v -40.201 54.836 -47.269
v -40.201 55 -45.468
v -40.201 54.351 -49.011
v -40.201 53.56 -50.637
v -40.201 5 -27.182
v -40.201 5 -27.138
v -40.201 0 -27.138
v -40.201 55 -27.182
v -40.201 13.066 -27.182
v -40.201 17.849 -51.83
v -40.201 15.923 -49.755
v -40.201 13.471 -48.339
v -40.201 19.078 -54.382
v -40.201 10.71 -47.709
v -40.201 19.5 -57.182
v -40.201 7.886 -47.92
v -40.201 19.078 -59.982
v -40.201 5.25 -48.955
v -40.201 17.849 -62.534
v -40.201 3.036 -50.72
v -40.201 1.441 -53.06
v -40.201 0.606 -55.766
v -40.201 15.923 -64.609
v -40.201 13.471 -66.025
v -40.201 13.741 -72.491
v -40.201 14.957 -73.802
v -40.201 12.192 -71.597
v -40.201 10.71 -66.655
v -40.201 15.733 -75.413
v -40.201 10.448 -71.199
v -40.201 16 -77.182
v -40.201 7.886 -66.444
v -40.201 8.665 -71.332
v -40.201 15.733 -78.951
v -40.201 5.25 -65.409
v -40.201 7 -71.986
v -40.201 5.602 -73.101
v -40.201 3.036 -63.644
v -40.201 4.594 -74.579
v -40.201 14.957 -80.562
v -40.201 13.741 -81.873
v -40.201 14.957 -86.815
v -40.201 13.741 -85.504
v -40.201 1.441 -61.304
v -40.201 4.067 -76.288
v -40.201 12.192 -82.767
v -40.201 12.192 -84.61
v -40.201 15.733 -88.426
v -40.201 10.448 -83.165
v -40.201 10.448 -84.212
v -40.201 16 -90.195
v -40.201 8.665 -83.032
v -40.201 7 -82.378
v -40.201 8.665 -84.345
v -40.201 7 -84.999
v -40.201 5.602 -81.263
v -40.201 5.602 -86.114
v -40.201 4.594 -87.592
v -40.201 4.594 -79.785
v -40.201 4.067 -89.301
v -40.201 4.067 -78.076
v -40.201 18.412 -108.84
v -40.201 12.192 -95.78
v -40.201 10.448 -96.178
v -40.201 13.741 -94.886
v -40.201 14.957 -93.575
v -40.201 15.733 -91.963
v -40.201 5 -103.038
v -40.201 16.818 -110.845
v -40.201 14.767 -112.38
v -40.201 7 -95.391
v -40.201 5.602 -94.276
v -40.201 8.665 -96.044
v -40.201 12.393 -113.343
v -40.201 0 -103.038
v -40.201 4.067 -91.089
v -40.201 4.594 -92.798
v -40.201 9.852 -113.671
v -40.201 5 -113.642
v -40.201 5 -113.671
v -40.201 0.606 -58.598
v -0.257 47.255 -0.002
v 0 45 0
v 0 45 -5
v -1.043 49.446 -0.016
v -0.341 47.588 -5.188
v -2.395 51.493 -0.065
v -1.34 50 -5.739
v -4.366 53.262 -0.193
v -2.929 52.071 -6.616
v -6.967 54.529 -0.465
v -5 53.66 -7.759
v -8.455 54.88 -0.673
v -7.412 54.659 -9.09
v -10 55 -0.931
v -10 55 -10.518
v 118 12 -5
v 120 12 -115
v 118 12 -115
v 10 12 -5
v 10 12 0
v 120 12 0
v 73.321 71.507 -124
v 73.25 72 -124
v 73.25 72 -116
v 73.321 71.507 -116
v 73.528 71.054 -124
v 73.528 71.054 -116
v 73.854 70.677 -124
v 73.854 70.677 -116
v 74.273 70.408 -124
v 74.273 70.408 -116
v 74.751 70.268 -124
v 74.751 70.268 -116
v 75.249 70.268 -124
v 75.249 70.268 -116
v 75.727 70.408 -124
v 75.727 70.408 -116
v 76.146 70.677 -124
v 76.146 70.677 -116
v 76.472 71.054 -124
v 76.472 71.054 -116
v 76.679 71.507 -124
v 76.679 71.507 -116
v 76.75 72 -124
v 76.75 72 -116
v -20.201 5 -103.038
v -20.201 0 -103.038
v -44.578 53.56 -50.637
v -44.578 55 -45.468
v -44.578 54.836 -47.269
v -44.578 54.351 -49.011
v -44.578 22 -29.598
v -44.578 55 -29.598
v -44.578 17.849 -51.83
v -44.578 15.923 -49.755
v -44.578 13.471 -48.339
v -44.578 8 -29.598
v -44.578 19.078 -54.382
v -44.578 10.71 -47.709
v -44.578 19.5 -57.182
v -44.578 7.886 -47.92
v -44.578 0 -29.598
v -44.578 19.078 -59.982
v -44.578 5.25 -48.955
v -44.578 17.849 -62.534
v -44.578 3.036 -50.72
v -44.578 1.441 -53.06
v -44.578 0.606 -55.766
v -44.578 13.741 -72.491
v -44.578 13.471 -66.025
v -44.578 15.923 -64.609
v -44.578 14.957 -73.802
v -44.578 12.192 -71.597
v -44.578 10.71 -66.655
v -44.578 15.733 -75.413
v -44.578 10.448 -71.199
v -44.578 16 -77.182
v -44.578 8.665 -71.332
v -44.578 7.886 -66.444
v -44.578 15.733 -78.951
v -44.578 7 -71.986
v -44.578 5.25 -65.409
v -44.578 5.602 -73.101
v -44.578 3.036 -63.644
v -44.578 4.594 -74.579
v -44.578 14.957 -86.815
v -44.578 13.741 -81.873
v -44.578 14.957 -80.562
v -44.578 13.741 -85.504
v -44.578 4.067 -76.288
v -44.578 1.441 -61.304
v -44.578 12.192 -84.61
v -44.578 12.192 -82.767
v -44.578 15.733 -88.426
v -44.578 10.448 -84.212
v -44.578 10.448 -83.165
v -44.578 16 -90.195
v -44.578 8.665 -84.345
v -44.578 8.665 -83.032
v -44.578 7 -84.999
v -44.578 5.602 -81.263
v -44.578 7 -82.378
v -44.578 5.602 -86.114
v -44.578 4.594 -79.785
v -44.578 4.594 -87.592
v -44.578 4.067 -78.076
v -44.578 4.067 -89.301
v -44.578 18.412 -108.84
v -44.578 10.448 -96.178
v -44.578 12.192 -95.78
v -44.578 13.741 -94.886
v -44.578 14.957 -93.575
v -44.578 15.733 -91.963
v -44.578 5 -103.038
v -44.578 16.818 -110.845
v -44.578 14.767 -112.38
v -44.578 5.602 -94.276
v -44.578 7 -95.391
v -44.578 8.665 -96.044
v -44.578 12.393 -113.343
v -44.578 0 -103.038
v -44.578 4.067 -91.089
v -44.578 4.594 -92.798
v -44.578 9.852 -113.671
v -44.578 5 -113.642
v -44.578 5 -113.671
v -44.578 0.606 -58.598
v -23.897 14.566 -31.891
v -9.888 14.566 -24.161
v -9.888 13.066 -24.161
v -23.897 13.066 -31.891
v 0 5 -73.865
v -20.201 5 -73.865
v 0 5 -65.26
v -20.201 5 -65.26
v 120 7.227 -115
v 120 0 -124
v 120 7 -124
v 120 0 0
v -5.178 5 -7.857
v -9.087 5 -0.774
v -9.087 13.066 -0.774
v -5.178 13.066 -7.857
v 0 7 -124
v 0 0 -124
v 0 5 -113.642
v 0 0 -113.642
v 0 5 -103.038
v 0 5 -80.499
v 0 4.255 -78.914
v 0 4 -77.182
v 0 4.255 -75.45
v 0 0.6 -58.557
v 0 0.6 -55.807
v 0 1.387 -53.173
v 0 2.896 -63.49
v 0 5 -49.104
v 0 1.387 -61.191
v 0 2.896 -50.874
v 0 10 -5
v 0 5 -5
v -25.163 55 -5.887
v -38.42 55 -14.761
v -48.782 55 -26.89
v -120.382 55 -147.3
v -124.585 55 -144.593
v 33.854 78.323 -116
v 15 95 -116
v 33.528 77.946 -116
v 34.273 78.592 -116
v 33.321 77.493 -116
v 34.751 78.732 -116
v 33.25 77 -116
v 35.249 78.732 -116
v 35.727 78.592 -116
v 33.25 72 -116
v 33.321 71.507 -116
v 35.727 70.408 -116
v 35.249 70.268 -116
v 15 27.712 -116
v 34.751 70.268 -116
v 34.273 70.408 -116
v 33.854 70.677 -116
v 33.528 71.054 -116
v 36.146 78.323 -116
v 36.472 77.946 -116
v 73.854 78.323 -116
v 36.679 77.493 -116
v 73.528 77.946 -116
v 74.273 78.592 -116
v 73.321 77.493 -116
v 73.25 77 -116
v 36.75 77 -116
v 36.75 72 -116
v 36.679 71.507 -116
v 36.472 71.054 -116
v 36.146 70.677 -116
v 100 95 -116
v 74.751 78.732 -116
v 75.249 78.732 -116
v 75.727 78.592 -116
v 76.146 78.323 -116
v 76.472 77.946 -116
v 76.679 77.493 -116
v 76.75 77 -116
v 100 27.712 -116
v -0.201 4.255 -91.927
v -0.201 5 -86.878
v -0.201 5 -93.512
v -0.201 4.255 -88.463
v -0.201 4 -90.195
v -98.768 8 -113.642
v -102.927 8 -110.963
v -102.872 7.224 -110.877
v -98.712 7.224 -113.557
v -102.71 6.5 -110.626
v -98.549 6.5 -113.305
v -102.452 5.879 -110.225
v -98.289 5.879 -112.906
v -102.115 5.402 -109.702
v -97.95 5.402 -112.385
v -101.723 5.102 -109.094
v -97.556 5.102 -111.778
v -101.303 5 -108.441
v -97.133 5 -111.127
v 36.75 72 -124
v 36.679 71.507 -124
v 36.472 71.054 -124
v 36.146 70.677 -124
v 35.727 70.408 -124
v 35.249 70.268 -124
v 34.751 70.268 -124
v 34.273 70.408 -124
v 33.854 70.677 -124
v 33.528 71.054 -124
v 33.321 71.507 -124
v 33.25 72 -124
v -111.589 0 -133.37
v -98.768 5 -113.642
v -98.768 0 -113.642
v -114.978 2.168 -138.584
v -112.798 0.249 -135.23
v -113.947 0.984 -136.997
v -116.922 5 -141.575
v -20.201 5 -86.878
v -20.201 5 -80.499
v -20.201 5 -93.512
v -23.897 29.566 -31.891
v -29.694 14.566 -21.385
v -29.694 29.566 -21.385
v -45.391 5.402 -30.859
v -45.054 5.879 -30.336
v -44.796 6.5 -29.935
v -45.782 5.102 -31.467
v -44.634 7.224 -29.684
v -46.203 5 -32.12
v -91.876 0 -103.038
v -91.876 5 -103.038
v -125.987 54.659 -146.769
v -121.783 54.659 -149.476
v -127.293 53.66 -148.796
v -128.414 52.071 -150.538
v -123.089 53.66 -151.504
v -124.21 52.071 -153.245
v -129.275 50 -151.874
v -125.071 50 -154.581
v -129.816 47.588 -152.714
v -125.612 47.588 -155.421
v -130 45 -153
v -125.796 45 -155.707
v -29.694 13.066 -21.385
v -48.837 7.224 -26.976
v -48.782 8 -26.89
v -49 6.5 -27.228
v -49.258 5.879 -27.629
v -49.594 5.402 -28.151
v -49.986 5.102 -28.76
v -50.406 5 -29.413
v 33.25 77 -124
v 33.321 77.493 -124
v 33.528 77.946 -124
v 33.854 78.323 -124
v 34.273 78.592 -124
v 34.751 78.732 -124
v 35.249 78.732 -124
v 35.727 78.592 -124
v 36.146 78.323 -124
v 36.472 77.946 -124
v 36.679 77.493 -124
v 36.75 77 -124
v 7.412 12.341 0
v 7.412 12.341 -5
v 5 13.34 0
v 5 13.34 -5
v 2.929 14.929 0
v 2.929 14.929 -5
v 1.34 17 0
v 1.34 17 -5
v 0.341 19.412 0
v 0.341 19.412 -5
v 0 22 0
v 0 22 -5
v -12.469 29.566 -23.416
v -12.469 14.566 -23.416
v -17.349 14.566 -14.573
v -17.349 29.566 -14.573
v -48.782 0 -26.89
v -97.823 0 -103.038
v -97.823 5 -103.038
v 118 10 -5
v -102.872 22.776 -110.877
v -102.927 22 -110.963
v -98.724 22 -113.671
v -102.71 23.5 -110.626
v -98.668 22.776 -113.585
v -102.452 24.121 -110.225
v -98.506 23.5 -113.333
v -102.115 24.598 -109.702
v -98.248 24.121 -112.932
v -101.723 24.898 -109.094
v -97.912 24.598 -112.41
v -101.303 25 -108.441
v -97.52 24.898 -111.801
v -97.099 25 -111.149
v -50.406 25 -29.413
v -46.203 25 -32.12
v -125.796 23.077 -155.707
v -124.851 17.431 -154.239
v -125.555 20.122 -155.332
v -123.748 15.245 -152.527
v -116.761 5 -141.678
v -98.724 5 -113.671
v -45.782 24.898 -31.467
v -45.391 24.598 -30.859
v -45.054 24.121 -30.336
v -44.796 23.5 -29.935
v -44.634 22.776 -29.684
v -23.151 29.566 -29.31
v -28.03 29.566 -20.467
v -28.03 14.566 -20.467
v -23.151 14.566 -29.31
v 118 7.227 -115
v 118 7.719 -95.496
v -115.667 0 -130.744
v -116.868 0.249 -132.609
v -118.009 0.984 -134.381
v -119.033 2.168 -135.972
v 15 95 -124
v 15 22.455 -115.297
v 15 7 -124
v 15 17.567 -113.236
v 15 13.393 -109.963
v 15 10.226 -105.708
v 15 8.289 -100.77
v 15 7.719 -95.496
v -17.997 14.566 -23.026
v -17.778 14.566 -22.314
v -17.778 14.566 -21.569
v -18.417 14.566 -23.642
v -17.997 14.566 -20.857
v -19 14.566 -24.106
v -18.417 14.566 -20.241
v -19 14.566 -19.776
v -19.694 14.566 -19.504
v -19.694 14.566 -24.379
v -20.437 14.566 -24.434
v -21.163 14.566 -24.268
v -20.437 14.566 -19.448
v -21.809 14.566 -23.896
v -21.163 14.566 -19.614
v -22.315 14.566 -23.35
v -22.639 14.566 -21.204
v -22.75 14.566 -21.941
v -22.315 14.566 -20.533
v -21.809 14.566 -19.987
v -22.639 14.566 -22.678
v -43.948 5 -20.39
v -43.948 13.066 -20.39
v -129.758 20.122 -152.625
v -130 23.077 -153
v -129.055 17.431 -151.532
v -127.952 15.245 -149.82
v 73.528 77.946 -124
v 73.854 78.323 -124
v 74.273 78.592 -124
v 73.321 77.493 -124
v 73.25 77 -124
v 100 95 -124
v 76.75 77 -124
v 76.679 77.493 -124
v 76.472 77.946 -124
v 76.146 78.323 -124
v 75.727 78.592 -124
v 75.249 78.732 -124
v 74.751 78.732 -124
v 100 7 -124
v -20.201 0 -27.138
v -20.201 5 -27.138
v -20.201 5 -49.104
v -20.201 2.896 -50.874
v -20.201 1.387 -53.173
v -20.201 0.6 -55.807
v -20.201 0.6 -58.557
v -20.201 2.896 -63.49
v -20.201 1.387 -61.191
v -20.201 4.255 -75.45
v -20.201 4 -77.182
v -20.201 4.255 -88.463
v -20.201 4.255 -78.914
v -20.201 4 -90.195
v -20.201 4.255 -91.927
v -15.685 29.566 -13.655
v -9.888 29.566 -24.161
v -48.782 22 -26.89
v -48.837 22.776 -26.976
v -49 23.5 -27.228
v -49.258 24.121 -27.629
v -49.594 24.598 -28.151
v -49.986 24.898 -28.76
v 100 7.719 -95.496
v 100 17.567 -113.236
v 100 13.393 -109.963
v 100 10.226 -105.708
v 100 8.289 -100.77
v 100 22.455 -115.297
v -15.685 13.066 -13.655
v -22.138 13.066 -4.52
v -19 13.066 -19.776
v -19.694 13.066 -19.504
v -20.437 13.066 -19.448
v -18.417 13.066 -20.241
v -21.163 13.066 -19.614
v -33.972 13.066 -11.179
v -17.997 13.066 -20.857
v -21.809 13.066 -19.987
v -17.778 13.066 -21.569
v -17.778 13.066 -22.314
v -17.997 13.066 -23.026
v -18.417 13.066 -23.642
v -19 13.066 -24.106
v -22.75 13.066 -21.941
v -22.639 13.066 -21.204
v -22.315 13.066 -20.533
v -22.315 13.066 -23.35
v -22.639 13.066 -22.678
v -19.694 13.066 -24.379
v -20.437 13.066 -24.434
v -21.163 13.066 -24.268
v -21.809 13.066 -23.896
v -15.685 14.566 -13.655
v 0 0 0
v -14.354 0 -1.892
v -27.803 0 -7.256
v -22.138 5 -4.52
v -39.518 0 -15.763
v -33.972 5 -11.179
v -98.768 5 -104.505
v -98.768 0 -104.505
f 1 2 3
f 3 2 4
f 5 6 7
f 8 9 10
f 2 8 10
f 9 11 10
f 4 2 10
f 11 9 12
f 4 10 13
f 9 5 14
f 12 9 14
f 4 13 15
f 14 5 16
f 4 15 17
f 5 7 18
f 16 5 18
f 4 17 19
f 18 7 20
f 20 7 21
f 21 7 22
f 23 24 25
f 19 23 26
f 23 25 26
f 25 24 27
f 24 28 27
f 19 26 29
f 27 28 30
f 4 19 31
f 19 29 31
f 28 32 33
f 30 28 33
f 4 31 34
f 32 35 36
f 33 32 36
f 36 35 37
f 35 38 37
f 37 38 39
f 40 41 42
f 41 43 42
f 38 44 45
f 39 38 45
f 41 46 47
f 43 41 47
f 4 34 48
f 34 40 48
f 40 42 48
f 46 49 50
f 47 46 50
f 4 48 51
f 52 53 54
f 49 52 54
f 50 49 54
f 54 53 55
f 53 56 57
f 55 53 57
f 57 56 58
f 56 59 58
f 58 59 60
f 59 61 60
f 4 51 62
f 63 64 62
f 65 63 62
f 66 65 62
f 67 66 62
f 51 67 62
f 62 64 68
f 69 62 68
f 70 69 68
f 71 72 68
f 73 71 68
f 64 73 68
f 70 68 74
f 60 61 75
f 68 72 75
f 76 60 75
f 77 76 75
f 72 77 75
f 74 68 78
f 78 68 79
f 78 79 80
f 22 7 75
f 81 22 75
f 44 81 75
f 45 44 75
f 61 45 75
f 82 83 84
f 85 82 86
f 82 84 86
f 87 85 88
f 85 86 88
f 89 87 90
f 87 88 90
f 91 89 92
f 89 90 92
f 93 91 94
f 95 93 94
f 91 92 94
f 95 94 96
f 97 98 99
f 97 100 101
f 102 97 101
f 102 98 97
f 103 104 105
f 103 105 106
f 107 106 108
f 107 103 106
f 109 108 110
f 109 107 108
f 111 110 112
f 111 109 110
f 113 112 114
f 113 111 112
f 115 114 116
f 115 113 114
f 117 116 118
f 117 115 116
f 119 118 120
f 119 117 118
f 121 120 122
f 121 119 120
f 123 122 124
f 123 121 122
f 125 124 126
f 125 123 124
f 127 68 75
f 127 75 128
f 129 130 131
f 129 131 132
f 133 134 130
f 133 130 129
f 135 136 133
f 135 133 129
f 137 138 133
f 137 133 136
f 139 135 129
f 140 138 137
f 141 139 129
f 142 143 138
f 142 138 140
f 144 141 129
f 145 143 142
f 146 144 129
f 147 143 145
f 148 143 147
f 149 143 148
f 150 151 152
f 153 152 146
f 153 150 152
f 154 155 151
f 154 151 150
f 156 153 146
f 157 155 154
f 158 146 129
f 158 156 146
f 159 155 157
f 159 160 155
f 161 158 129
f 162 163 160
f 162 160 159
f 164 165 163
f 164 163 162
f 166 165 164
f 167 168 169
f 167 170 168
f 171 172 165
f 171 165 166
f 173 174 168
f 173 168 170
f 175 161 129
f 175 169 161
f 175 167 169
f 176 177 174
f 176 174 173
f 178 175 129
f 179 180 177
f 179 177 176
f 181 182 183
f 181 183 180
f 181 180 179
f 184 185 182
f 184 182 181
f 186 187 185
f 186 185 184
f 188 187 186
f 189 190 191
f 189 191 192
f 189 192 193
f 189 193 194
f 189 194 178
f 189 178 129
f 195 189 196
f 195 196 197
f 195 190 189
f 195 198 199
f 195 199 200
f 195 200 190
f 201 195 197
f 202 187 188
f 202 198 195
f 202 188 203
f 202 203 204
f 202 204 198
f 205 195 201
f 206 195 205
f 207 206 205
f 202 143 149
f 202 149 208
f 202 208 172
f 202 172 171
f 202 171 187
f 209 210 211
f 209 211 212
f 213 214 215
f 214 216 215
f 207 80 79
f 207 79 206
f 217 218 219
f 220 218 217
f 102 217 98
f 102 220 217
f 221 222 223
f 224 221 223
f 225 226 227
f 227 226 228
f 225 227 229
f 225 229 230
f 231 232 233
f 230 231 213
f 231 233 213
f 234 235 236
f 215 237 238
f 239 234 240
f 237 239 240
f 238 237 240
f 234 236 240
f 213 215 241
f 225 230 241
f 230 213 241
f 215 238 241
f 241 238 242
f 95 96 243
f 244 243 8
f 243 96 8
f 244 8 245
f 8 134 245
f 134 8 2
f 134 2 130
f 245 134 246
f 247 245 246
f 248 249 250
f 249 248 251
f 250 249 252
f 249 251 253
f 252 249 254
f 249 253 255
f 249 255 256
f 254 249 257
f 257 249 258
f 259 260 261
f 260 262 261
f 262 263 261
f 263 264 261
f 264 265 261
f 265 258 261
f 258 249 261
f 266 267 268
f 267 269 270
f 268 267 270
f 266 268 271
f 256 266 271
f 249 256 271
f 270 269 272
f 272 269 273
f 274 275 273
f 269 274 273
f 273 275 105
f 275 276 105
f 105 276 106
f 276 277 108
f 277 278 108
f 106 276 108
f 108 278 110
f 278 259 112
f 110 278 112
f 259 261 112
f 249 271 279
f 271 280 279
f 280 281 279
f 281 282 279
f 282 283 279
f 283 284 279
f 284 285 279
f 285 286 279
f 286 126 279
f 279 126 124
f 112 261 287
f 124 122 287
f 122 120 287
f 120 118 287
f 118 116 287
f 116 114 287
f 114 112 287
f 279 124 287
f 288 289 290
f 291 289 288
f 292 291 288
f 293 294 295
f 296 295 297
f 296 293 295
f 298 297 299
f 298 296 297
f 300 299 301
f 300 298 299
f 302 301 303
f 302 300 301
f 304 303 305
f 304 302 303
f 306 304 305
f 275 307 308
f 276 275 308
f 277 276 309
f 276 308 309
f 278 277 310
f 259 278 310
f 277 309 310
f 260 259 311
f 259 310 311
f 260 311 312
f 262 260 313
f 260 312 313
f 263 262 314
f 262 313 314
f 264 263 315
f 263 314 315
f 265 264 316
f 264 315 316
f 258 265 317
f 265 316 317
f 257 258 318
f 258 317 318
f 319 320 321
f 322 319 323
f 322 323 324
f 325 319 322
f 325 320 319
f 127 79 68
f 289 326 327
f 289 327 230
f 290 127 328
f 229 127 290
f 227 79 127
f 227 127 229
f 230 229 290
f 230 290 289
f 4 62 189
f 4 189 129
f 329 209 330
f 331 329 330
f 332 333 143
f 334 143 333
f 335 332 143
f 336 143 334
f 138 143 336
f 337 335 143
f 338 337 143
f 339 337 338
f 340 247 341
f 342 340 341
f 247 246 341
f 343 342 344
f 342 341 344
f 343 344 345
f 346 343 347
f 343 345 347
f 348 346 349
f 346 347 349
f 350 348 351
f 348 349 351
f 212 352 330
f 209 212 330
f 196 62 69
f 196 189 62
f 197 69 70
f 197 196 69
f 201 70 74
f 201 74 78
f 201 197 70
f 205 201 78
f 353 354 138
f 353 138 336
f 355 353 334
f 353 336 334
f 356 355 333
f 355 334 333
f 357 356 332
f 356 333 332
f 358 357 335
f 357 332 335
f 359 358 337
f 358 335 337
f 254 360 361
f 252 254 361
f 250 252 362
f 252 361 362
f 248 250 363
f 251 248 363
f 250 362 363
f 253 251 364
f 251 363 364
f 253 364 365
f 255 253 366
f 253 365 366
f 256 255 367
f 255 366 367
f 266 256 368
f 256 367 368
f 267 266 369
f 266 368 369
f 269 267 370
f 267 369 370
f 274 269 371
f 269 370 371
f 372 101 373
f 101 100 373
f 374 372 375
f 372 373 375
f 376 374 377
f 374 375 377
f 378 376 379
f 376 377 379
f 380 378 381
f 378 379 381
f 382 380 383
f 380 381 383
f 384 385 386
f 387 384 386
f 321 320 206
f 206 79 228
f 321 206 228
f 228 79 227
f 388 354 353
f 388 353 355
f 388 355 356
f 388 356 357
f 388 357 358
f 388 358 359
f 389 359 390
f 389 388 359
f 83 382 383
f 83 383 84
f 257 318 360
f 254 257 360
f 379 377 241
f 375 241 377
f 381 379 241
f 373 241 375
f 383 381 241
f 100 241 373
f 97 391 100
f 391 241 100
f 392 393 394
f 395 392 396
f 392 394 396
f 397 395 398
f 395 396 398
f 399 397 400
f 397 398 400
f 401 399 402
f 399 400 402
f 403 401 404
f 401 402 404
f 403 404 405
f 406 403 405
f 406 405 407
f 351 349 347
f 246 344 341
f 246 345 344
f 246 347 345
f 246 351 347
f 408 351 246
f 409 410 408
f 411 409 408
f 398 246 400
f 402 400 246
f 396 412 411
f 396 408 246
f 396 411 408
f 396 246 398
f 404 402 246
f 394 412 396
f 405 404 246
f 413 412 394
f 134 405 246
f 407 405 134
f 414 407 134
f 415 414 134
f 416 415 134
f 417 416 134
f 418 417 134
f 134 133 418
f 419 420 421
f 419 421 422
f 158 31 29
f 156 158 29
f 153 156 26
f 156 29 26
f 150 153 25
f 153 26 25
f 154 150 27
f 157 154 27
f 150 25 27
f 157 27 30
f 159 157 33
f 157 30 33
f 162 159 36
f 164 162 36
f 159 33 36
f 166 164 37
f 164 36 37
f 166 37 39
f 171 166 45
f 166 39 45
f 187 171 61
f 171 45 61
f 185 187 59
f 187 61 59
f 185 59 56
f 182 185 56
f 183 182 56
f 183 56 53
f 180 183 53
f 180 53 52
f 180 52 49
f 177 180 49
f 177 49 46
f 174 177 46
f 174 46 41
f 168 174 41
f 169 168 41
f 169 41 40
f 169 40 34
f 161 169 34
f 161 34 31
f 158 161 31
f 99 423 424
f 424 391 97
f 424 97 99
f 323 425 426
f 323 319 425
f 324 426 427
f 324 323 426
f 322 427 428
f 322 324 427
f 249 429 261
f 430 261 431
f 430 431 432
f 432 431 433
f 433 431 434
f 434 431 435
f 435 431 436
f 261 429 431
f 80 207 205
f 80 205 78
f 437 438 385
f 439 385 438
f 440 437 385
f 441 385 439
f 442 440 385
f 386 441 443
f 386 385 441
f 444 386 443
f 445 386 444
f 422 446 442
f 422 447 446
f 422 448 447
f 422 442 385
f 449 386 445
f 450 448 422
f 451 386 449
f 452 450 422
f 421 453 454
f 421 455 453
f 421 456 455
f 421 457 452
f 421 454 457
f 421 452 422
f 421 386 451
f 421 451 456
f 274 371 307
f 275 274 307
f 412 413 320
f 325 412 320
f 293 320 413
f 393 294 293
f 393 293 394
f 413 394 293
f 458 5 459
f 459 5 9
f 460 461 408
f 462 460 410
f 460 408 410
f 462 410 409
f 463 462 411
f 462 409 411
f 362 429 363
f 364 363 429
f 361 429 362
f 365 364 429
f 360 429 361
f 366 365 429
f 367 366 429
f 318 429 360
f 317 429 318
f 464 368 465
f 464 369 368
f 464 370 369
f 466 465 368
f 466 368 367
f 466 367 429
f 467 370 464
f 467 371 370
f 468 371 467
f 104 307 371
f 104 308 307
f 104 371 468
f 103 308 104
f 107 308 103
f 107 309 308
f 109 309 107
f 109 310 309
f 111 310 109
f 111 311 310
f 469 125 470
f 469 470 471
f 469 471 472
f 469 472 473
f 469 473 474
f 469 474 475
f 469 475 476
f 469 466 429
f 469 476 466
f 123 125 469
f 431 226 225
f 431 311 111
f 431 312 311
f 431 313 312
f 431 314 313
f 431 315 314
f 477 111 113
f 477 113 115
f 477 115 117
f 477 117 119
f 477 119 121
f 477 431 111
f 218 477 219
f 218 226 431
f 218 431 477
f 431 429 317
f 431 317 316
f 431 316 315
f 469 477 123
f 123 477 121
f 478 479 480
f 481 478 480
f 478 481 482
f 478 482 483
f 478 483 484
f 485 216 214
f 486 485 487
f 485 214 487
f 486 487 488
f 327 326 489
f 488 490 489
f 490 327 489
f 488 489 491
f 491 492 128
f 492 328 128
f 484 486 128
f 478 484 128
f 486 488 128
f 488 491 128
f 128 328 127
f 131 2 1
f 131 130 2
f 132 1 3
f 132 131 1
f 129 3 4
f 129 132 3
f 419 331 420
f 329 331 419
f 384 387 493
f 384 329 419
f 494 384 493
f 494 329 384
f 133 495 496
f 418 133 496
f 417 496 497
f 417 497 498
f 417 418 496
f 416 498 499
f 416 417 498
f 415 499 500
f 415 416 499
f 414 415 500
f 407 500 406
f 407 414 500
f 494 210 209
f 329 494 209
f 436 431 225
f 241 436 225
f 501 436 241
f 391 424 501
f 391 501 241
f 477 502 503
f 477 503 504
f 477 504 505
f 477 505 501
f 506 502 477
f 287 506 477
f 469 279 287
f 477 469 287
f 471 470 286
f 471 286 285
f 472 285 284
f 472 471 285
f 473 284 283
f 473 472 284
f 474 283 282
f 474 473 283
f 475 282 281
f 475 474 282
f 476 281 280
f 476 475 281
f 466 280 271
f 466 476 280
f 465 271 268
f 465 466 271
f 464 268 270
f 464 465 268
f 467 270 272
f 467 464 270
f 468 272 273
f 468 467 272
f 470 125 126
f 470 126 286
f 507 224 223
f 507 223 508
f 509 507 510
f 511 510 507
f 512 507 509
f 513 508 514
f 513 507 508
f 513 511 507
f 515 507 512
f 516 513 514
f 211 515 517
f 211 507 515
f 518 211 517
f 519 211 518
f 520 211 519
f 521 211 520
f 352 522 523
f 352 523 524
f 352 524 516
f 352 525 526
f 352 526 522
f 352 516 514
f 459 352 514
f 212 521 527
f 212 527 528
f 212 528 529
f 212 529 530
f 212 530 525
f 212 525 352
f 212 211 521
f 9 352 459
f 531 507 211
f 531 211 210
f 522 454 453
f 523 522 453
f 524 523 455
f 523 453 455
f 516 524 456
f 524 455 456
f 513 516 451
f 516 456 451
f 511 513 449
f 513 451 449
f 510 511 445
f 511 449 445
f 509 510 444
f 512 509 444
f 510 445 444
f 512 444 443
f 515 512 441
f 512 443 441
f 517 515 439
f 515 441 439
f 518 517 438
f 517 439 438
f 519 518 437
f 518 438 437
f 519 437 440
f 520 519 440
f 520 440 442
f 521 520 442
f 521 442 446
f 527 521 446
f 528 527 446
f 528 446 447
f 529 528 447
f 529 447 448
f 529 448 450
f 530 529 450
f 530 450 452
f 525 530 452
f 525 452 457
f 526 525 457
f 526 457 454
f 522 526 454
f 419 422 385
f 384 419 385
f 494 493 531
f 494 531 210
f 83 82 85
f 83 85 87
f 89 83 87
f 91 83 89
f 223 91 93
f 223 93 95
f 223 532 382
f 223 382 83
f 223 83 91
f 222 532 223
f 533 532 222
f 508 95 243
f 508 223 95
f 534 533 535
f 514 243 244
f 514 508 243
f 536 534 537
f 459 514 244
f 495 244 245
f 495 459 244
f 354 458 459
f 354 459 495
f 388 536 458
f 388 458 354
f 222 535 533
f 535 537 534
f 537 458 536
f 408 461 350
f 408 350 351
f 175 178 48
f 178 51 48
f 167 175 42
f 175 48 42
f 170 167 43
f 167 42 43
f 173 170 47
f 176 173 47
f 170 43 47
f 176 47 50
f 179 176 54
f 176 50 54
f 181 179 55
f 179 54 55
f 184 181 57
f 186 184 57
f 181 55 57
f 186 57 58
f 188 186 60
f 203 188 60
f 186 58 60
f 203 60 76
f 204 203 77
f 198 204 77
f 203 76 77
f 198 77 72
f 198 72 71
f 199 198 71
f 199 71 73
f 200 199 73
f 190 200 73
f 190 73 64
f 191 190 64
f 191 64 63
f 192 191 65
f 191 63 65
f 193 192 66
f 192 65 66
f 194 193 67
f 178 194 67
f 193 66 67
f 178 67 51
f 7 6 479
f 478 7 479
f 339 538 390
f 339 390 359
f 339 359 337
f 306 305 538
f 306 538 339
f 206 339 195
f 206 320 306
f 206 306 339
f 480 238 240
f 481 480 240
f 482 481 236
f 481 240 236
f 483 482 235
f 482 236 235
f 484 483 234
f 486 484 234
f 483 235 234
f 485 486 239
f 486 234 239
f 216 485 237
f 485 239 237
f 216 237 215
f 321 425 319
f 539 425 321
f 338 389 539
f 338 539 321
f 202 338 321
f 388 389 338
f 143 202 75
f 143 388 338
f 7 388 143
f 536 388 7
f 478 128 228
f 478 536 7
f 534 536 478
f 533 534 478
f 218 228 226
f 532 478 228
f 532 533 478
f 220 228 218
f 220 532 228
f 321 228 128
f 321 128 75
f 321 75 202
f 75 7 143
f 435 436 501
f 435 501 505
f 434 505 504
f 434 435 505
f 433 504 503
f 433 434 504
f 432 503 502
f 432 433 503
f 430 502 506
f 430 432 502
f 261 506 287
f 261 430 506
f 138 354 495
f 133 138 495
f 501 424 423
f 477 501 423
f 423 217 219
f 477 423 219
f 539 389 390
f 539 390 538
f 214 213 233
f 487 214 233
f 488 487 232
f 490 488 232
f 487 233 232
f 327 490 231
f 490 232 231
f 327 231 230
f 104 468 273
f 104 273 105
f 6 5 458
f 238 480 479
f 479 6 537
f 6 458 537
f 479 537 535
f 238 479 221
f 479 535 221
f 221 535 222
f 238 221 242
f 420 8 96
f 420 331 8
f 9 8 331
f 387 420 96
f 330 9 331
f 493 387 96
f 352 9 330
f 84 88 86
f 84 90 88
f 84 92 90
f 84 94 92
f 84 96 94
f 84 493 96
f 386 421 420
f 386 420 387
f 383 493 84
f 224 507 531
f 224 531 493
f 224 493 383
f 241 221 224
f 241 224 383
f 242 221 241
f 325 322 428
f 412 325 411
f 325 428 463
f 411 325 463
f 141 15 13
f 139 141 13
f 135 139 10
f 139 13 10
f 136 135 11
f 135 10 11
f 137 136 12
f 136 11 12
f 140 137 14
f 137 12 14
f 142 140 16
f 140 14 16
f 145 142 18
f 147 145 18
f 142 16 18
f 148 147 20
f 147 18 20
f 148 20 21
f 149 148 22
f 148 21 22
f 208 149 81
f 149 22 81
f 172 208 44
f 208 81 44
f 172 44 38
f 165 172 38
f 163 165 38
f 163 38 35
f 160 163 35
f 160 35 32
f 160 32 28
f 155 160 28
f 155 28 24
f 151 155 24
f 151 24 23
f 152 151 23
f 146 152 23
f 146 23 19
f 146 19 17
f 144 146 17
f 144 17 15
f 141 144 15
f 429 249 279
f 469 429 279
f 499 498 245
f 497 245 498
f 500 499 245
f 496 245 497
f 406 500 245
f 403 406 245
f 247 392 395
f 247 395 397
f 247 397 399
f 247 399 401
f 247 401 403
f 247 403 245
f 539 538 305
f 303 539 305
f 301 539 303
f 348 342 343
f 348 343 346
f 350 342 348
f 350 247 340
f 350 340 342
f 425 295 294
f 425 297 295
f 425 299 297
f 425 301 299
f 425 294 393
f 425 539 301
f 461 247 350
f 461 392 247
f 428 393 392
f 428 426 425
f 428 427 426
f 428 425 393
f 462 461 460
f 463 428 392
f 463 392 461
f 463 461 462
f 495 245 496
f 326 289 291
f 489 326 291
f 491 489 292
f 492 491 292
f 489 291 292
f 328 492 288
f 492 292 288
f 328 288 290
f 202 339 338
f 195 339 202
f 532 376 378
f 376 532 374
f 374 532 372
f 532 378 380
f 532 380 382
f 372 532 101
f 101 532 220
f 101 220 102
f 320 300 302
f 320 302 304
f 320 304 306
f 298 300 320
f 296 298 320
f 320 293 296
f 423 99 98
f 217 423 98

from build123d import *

# Parameters (mm, degrees)
SKETCH1_W            = 155
SKETCH1_H            = 5
BOSS_EXTRUDE2_DEPTH  = 55
SKETCH2_W            = 112
SKETCH2_H            = 45
SKETCH2_R            = 1.75
CUT_EXTRUDE1_DEPTH   = 55
SKETCH3_W            = 100
SKETCH3_H            = 20
CUT_EXTRUDE2_DEPTH   = 55
SKETCH4_W            = 40
SKETCH4_H            = 8.065867699
CUT_EXTRUDE3_DEPTH   = 55
BOSS_EXTRUDE4_DEPTH  = 5
CUT_EXTRUDE4_DEPTH   = 50
SKETCH9_W            = 4.377781836
SKETCH9_H            = 86.488706471
BOSS_EXTRUDE7_DEPTH  = 50
SKETCH10_W           = 20
SKETCH10_H           = 86.532324722
CUT_EXTRUDE5_DEPTH   = 10
SKETCH12_R           = 9.5
SKETCH12_R_2         = 6
CUT_EXTRUDE6_DEPTH   = 10
CUT_EXTRUDE7_START   = 50
SKETCH13_R           = 9.5
SKETCH13_R_2         = 6
CUT_EXTRUDE7_DEPTH   = 50
CUT_EXTRUDE8_DEPTH   = 50
CUT_EXTRUDE9_DEPTH   = 50
CUT_EXTRUDE10_DEPTH  = 10
FILLET5_R            = 3
SKETCH18_W           = 98.767816147
SKETCH18_H           = 10.604205858
BOSS_EXTRUDE8_DEPTH  = 5
CUT_EXTRUDE11_DEPTH  = 5
SKETCH20_W           = 155
SKETCH20_H           = 119
BOSS_EXTRUDE9_DEPTH  = 10
CUT_EXTRUDE13_DEPTH  = 155
SKETCH24_W           = 110
SKETCH24_H           = 8
BOSS_EXTRUDE10_DEPTH = 95
FILLET6_R            = 20
SKETCH26_W           = 16
SKETCH26_H           = 1.5
BOSS_EXTRUDE11_DEPTH = 12
BOSS_EXTRUDE12_DEPTH = 15
SKETCH28_R           = 2.5
CUT_EXTRUDE15_DEPTH  = 5
CUT_EXTRUDE17_DEPTH  = 35
SKETCH29_W           = 43
SKETCH29_H           = 43
CUT_EXTRUDE18_DEPTH  = 35
FILLET9_R            = 10
SKETCH31_W           = 124
SKETCH31_H           = 12
BOSS_EXTRUDE14_DEPTH = 2
SKETCH32_W           = 5
SKETCH32_H           = 2
BOSS_EXTRUDE15_DEPTH = 132
SKETCH33_W           = 20
SKETCH33_H           = 12
CUT_EXTRUDE19_DEPTH  = 160
SKETCH34_W           = 2
SKETCH34_H           = 12
BOSS_EXTRUDE17_DEPTH = 123
SKETCH36_R           = 6
CUT_EXTRUDE20_DEPTH  = 40
CUT_EXTRUDE21_DEPTH  = 25
SKETCH39_W           = 15
SKETCH39_H           = 12
CUT_EXTRUDE22_DEPTH  = 165
FILLET10_R           = 10
SKETCH40_W           = 2
SKETCH40_H           = 12
BOSS_EXTRUDE18_DEPTH = 115


with BuildPart() as part:
    # Sketch1 → Boss-Extrude2 (new body)
    with BuildSketch(Plane(origin=(0, 0, 0), x_dir=(1, 0, 0), z_dir=(0, 1, 0))):
        Polygon((-44.578450817, 29.59757322), (-48.782107146, 26.890310125), (-130, 153), (-125.796343671, 155.707263095), align=None)
        with BuildLine():
            ThreePointArc((0, 0), (-27.802696096, 7.256044178), (-48.782107146, 26.890310125))
            Line((-48.782107146, 26.890310125), (-44.578450817, 29.59757322))
            Line((-44.578450817, 29.59757322), (0, 5))
            Line((0, 5), (0, 0))
        make_face()
        with Locations((77.5, 2.5)):
            Rectangle(SKETCH1_W, SKETCH1_H)
    extrude(amount=BOSS_EXTRUDE2_DEPTH)

    # Sketch2 → Cut-Extrude1 (cut)
    with BuildSketch(Plane.XY):
        with Locations((99, 32.5)):
            Rectangle(SKETCH2_W, SKETCH2_H)
        with Locations((5, 25)):
            Circle(SKETCH2_R)
        with Locations((5, 50)):
            Circle(SKETCH2_R)
        with Locations((35, 50)):
            Circle(SKETCH2_R)
        with Locations((35, 25)):
            Circle(SKETCH2_R)
    extrude(amount=-CUT_EXTRUDE1_DEPTH, mode=Mode.SUBTRACT)

    # Sketch3 → Cut-Extrude2 (cut)
    with BuildSketch(Plane(origin=(-22.239707671, 0, 14.322945338), x_dir=(0.5414526190246729, 0, 0.840731265834287), z_dir=(-0.8407312658342869, 0, 0.5414526190246728))):
        with Locations((-99.020724146, 15)):
            Rectangle(SKETCH3_W, SKETCH3_H)
    extrude(amount=-CUT_EXTRUDE2_DEPTH, mode=Mode.SUBTRACT)

    # Sketch4 → Cut-Extrude3 (cut)
    with BuildSketch(Plane(origin=(2.114976352, 0, -3.832994761), x_dir=(-0.8755563671808256, 0, -0.48311597767939257), z_dir=(0.48311597767939257, 0, -0.8755563671808256))):
        with Locations((28.330006975, 9.03293385)):
            Rectangle(SKETCH4_W, SKETCH4_H)
    extrude(amount=-CUT_EXTRUDE3_DEPTH, mode=Mode.SUBTRACT)

    # Sketch5 → Boss-Extrude4 (add)
    with BuildSketch(Plane.XZ):
        Polygon((0, -5), (-44.578450817, -29.59757322), (-125.796343671, -155.707263095), (0, -155.707263095), align=None)
    extrude(amount=-BOSS_EXTRUDE4_DEPTH)

    # Sketch8 → Cut-Extrude4 (cut)
    with BuildSketch(Plane(origin=(0, 5, 0), x_dir=(1, 0, 0), z_dir=(0, 1, 0))):
        Polygon((-44.578450817, 29.59757322), (-98.72371272, 113.670699803), (-44.578450817, 113.670699803), align=None)
    extrude(amount=-CUT_EXTRUDE4_DEPTH, mode=Mode.SUBTRACT)

    # Sketch9 → Boss-Extrude7 (add)
    with BuildSketch(Plane(origin=(0, 5, 0), x_dir=(1, 0, 0), z_dir=(0, 1, 0))):
        with Locations((-42.389559899, 70.426346568)):
            Rectangle(SKETCH9_W, SKETCH9_H)
    extrude(amount=BOSS_EXTRUDE7_DEPTH)

    # Sketch10 → Cut-Extrude5 (cut)
    with BuildSketch(Plane(origin=(0, 5, 0), x_dir=(1, 0, 0), z_dir=(0, 1, 0))):
        with Locations((-30.200668981, 70.404537442)):
            Rectangle(SKETCH10_W, SKETCH10_H)
    extrude(amount=-CUT_EXTRUDE5_DEPTH, mode=Mode.SUBTRACT)

    # Sketch12 → Cut-Extrude6 (cut)
    with BuildSketch(Plane(origin=(-40.200668981, 0, 0), x_dir=(0, 0, -1), z_dir=(1, 0, 0))):
        with Locations(Location((57.181993332, 10, 0), (0, 0, 90))):
            Circle(SKETCH12_R)
        with Locations(Location((77.181993332, 10, 0), (0, 0, 90))):
            Circle(SKETCH12_R_2)
    extrude(amount=-CUT_EXTRUDE6_DEPTH, mode=Mode.SUBTRACT)

    # Sketch13 → Cut-Extrude7 (cut)
    with BuildSketch(Plane(origin=(-40.200668981, 0, 0), x_dir=(0, 0, -1), z_dir=(1, 0, 0)).offset(CUT_EXTRUDE7_START)):
        with Locations(Location((57.181993332, 10, 0), (0, 0, 90))):
            Circle(SKETCH13_R)
        with Locations(Location((77.181993332, 10, 0), (0, 0, 90))):
            Circle(SKETCH13_R_2)
    extrude(amount=-CUT_EXTRUDE7_DEPTH, mode=Mode.SUBTRACT)

    # Sketch14 → Cut-Extrude8 (cut)
    with BuildSketch(Plane(origin=(0, 5, 0), x_dir=(1, 0, 0), z_dir=(0, 1, 0))):
        Polygon((0, 103.038090201), (-91.876037903, 103.038090201), (-126.106254173, 155.707263095), (0, 155.707263095), align=None)
    extrude(amount=-CUT_EXTRUDE8_DEPTH, mode=Mode.SUBTRACT)

    # Sketch15 → Cut-Extrude9 (cut)
    with BuildSketch(Plane(origin=(-22.239707671, 0, 14.322945338), x_dir=(0.5414526190246729, 0, 0.840731265834287), z_dir=(-0.8407312658342869, 0, 0.5414526190246728))):
        Polygon((-176.035909688, 0), (-199.020724146, 18.247450711), (-199.020724146, 0), align=None)
    extrude(amount=-CUT_EXTRUDE9_DEPTH, mode=Mode.SUBTRACT)

    # Sketch16 → Cut-Extrude10 (cut)
    with BuildSketch(Plane(origin=(-40.200668981, 0, 0), x_dir=(0, 0, -1), z_dir=(1, 0, 0))):
        Polygon((113.670699803, 15.495236251), (48.252901996, 55), (113.670699803, 55), align=None)
    extrude(amount=-CUT_EXTRUDE10_DEPTH, mode=Mode.SUBTRACT)

    # Fillet5
    fillet5_edges = [part.edges().sort_by_distance(p)[0] for p in [
        (-100.847592598, 5, -112.302866383),
        (-46.680278982, 25, -28.243941672),
        (-46.680278982, 5, -28.243941672),
        (-100.825540884, 25, -112.317068256),
    ]]
    fillet(fillet5_edges, radius=FILLET5_R)

    # Sketch18 → Boss-Extrude8 (add)
    with BuildSketch(Plane(origin=(0, 5, 0), x_dir=(1, 0, 0), z_dir=(0, 1, 0))):
        with Locations((-49.383908074, 108.34019313)):
            Rectangle(SKETCH18_W, SKETCH18_H)
    extrude(amount=-BOSS_EXTRUDE8_DEPTH)

    # Sketch19 → Cut-Extrude11 (cut)
    with BuildSketch(Plane.XZ):
        Polygon((-97.82324149, -103.038090201), (-98.767816147, -104.504762295), (-98.767816147, -103.038090201), align=None)
    extrude(amount=-CUT_EXTRUDE11_DEPTH, mode=Mode.SUBTRACT)

    # Sketch20 → Boss-Extrude9 (add)
    with BuildSketch(Plane.XZ):
        with Locations((77.5, -64.5)):
            Rectangle(SKETCH20_W, SKETCH20_H)
    extrude(amount=-BOSS_EXTRUDE9_DEPTH)

    # Sketch21 → Cut-Extrude13 (cut)
    with BuildSketch(Plane(origin=(155, 0, 0), x_dir=(0, 0, -1), z_dir=(1, 0, 0))):
        Polygon((5, 10), (124, 10), (124, 7), align=None)
    extrude(amount=-CUT_EXTRUDE13_DEPTH, mode=Mode.SUBTRACT)

    # Sketch24 → Boss-Extrude10 (add)
    with BuildSketch(Plane.XZ):
        with Locations((70, -120)):
            Rectangle(SKETCH24_W, SKETCH24_H)
    extrude(amount=-BOSS_EXTRUDE10_DEPTH)

    # Fillet6
    fillet6_edges = [part.edges().sort_by_distance(p)[0] for p in [
        (70, 7.201680672, -116),
    ]]
    fillet(fillet6_edges, radius=FILLET6_R)

    # Sketch26 → Boss-Extrude11 (add)
    with BuildSketch(Plane(origin=(2.114976352, 0, -3.832994761), x_dir=(-0.8755563671808256, 0, -0.48311597767939257), z_dir=(0.48311597767939257, 0, -0.8755563671808256))):
        with Locations((28.330006975, 13.815867699)):
            Rectangle(SKETCH26_W, SKETCH26_H)
    extrude(amount=BOSS_EXTRUDE11_DEPTH)

    # Sketch27 → Boss-Extrude12 (add)
    with BuildSketch(Plane(origin=(0, 14.565867699, 0), x_dir=(1, 0, 0), z_dir=(0, 1, 0))):
        Polygon((-15.6850907, 13.654745957), (-9.887698968, 24.161422363), (-23.896600843, 31.891278006), (-29.693992575, 21.384601599), (-28.030435477, 20.466681242), (-23.150964103, 29.30980055), (-12.469176423, 23.415785623), (-17.348647798, 14.572666314), align=None)
    extrude(amount=BOSS_EXTRUDE12_DEPTH)

    # Sketch28 → Cut-Extrude15 (cut)
    with BuildSketch(Plane(origin=(0, 14.565867699, 0), x_dir=(1, 0, 0), z_dir=(0, 1, 0))):
        with Locations(Location((-20.24980595, 21.941233432, 0), (0, 0, 180))):
            Circle(SKETCH28_R)
    extrude(amount=-CUT_EXTRUDE15_DEPTH, mode=Mode.SUBTRACT)

    # Sketch25 → Cut-Extrude17 (cut)
    with BuildSketch(Plane(origin=(0, 0, -124), x_dir=(-1, 0, 0), z_dir=(0, 0, -1))):
        with BuildLine():
            Line((-36.75, 77), (-36.75, 72))
            ThreePointArc((-36.75, 72), (-35, 70.25), (-33.25, 72))
            Line((-33.25, 72), (-33.25, 77))
            ThreePointArc((-33.25, 77), (-35, 78.75), (-36.75, 77))
        make_face()
        with BuildLine():
            Line((-73.25, 77), (-73.25, 72))
            ThreePointArc((-73.25, 72), (-75, 70.25), (-76.75, 72))
            Line((-76.75, 72), (-76.75, 77))
            ThreePointArc((-76.75, 77), (-75, 78.75), (-73.25, 77))
        make_face()
    extrude(amount=-CUT_EXTRUDE17_DEPTH, mode=Mode.SUBTRACT)

    # Sketch29 → Cut-Extrude18 (cut)
    with BuildSketch(Plane.XY):
        with Locations((21.5, 33.5)):
            Rectangle(SKETCH29_W, SKETCH29_H)
    extrude(amount=-CUT_EXTRUDE18_DEPTH, mode=Mode.SUBTRACT)

    # Fillet9
    fillet9_edges = [part.edges().sort_by_distance(p)[0] for p in [
        (-115.522140631, 0, -134.985040643),
        (-127.898171835, 18.247450711, -154.353631548),
        (-42.389559899, 15.495236251, -113.670699803),
        (-42.389559899, 55, -48.252901996),
        (-127.898171835, 55, -154.353631548),
    ]]
    fillet(fillet9_edges, radius=FILLET9_R)

    # Sketch31 → Boss-Extrude14 (add)
    with BuildSketch(Plane(origin=(155, 0, 0), x_dir=(0, 0, -1), z_dir=(1, 0, 0))):
        with Locations((62, 6)):
            Rectangle(SKETCH31_W, SKETCH31_H)
    extrude(amount=-BOSS_EXTRUDE14_DEPTH)

    # Sketch32 → Boss-Extrude15 (add)
    with BuildSketch(Plane.ZY.offset(-153)):
        with Locations((-2.5, 11)):
            Rectangle(SKETCH32_W, SKETCH32_H)
    extrude(amount=BOSS_EXTRUDE15_DEPTH)

    # Sketch33 → Cut-Extrude19 (cut)
    with BuildSketch(Plane.XY):
        with Locations((145, 6)):
            Rectangle(SKETCH33_W, SKETCH33_H)
    extrude(amount=-CUT_EXTRUDE19_DEPTH, mode=Mode.SUBTRACT)

    # Sketch34 → Boss-Extrude17 (add)
    with BuildSketch(Plane.XY):
        with Locations((134, 6)):
            Rectangle(SKETCH34_W, SKETCH34_H)
    extrude(amount=-BOSS_EXTRUDE17_DEPTH)

    # Sketch36 → Cut-Extrude20 (cut, symmetric)
    with BuildSketch(Plane(origin=(-40.200668981, 0, 0), x_dir=(0, 0, -1), z_dir=(1, 0, 0))):
        with Locations(Location((90.194878088, 10, 0), (0, 0, 90))):
            Circle(SKETCH36_R)
    extrude(amount=CUT_EXTRUDE20_DEPTH, both=True, mode=Mode.SUBTRACT)

    # Sketch38 → Cut-Extrude21 (cut)
    with BuildSketch(Plane(origin=(125, 0, 0), x_dir=(0, 0, -1), z_dir=(1, 0, 0))):
        Polygon((95.495958465, 7.718589282), (124, 7), (124, 95), (116, 95), align=None)
    extrude(amount=-CUT_EXTRUDE21_DEPTH, mode=Mode.SUBTRACT)

    # Sketch39 → Cut-Extrude22 (cut)
    with BuildSketch(Plane.XY):
        with Locations((127.5, 6)):
            Rectangle(SKETCH39_W, SKETCH39_H)
    extrude(amount=-CUT_EXTRUDE22_DEPTH, mode=Mode.SUBTRACT)

    # Fillet10
    fillet10_edges = [part.edges().sort_by_distance(p)[0] for p in [
        (0, 12, -2.5),
        (0, 55, -2.5),
    ]]
    fillet(fillet10_edges, radius=FILLET10_R)

    # Sketch40 → Boss-Extrude18 (add)
    with BuildSketch(Plane.XY):
        with Locations((119, 6)):
            Rectangle(SKETCH40_W, SKETCH40_H)
    extrude(amount=-BOSS_EXTRUDE18_DEPTH)


solid = part.part
